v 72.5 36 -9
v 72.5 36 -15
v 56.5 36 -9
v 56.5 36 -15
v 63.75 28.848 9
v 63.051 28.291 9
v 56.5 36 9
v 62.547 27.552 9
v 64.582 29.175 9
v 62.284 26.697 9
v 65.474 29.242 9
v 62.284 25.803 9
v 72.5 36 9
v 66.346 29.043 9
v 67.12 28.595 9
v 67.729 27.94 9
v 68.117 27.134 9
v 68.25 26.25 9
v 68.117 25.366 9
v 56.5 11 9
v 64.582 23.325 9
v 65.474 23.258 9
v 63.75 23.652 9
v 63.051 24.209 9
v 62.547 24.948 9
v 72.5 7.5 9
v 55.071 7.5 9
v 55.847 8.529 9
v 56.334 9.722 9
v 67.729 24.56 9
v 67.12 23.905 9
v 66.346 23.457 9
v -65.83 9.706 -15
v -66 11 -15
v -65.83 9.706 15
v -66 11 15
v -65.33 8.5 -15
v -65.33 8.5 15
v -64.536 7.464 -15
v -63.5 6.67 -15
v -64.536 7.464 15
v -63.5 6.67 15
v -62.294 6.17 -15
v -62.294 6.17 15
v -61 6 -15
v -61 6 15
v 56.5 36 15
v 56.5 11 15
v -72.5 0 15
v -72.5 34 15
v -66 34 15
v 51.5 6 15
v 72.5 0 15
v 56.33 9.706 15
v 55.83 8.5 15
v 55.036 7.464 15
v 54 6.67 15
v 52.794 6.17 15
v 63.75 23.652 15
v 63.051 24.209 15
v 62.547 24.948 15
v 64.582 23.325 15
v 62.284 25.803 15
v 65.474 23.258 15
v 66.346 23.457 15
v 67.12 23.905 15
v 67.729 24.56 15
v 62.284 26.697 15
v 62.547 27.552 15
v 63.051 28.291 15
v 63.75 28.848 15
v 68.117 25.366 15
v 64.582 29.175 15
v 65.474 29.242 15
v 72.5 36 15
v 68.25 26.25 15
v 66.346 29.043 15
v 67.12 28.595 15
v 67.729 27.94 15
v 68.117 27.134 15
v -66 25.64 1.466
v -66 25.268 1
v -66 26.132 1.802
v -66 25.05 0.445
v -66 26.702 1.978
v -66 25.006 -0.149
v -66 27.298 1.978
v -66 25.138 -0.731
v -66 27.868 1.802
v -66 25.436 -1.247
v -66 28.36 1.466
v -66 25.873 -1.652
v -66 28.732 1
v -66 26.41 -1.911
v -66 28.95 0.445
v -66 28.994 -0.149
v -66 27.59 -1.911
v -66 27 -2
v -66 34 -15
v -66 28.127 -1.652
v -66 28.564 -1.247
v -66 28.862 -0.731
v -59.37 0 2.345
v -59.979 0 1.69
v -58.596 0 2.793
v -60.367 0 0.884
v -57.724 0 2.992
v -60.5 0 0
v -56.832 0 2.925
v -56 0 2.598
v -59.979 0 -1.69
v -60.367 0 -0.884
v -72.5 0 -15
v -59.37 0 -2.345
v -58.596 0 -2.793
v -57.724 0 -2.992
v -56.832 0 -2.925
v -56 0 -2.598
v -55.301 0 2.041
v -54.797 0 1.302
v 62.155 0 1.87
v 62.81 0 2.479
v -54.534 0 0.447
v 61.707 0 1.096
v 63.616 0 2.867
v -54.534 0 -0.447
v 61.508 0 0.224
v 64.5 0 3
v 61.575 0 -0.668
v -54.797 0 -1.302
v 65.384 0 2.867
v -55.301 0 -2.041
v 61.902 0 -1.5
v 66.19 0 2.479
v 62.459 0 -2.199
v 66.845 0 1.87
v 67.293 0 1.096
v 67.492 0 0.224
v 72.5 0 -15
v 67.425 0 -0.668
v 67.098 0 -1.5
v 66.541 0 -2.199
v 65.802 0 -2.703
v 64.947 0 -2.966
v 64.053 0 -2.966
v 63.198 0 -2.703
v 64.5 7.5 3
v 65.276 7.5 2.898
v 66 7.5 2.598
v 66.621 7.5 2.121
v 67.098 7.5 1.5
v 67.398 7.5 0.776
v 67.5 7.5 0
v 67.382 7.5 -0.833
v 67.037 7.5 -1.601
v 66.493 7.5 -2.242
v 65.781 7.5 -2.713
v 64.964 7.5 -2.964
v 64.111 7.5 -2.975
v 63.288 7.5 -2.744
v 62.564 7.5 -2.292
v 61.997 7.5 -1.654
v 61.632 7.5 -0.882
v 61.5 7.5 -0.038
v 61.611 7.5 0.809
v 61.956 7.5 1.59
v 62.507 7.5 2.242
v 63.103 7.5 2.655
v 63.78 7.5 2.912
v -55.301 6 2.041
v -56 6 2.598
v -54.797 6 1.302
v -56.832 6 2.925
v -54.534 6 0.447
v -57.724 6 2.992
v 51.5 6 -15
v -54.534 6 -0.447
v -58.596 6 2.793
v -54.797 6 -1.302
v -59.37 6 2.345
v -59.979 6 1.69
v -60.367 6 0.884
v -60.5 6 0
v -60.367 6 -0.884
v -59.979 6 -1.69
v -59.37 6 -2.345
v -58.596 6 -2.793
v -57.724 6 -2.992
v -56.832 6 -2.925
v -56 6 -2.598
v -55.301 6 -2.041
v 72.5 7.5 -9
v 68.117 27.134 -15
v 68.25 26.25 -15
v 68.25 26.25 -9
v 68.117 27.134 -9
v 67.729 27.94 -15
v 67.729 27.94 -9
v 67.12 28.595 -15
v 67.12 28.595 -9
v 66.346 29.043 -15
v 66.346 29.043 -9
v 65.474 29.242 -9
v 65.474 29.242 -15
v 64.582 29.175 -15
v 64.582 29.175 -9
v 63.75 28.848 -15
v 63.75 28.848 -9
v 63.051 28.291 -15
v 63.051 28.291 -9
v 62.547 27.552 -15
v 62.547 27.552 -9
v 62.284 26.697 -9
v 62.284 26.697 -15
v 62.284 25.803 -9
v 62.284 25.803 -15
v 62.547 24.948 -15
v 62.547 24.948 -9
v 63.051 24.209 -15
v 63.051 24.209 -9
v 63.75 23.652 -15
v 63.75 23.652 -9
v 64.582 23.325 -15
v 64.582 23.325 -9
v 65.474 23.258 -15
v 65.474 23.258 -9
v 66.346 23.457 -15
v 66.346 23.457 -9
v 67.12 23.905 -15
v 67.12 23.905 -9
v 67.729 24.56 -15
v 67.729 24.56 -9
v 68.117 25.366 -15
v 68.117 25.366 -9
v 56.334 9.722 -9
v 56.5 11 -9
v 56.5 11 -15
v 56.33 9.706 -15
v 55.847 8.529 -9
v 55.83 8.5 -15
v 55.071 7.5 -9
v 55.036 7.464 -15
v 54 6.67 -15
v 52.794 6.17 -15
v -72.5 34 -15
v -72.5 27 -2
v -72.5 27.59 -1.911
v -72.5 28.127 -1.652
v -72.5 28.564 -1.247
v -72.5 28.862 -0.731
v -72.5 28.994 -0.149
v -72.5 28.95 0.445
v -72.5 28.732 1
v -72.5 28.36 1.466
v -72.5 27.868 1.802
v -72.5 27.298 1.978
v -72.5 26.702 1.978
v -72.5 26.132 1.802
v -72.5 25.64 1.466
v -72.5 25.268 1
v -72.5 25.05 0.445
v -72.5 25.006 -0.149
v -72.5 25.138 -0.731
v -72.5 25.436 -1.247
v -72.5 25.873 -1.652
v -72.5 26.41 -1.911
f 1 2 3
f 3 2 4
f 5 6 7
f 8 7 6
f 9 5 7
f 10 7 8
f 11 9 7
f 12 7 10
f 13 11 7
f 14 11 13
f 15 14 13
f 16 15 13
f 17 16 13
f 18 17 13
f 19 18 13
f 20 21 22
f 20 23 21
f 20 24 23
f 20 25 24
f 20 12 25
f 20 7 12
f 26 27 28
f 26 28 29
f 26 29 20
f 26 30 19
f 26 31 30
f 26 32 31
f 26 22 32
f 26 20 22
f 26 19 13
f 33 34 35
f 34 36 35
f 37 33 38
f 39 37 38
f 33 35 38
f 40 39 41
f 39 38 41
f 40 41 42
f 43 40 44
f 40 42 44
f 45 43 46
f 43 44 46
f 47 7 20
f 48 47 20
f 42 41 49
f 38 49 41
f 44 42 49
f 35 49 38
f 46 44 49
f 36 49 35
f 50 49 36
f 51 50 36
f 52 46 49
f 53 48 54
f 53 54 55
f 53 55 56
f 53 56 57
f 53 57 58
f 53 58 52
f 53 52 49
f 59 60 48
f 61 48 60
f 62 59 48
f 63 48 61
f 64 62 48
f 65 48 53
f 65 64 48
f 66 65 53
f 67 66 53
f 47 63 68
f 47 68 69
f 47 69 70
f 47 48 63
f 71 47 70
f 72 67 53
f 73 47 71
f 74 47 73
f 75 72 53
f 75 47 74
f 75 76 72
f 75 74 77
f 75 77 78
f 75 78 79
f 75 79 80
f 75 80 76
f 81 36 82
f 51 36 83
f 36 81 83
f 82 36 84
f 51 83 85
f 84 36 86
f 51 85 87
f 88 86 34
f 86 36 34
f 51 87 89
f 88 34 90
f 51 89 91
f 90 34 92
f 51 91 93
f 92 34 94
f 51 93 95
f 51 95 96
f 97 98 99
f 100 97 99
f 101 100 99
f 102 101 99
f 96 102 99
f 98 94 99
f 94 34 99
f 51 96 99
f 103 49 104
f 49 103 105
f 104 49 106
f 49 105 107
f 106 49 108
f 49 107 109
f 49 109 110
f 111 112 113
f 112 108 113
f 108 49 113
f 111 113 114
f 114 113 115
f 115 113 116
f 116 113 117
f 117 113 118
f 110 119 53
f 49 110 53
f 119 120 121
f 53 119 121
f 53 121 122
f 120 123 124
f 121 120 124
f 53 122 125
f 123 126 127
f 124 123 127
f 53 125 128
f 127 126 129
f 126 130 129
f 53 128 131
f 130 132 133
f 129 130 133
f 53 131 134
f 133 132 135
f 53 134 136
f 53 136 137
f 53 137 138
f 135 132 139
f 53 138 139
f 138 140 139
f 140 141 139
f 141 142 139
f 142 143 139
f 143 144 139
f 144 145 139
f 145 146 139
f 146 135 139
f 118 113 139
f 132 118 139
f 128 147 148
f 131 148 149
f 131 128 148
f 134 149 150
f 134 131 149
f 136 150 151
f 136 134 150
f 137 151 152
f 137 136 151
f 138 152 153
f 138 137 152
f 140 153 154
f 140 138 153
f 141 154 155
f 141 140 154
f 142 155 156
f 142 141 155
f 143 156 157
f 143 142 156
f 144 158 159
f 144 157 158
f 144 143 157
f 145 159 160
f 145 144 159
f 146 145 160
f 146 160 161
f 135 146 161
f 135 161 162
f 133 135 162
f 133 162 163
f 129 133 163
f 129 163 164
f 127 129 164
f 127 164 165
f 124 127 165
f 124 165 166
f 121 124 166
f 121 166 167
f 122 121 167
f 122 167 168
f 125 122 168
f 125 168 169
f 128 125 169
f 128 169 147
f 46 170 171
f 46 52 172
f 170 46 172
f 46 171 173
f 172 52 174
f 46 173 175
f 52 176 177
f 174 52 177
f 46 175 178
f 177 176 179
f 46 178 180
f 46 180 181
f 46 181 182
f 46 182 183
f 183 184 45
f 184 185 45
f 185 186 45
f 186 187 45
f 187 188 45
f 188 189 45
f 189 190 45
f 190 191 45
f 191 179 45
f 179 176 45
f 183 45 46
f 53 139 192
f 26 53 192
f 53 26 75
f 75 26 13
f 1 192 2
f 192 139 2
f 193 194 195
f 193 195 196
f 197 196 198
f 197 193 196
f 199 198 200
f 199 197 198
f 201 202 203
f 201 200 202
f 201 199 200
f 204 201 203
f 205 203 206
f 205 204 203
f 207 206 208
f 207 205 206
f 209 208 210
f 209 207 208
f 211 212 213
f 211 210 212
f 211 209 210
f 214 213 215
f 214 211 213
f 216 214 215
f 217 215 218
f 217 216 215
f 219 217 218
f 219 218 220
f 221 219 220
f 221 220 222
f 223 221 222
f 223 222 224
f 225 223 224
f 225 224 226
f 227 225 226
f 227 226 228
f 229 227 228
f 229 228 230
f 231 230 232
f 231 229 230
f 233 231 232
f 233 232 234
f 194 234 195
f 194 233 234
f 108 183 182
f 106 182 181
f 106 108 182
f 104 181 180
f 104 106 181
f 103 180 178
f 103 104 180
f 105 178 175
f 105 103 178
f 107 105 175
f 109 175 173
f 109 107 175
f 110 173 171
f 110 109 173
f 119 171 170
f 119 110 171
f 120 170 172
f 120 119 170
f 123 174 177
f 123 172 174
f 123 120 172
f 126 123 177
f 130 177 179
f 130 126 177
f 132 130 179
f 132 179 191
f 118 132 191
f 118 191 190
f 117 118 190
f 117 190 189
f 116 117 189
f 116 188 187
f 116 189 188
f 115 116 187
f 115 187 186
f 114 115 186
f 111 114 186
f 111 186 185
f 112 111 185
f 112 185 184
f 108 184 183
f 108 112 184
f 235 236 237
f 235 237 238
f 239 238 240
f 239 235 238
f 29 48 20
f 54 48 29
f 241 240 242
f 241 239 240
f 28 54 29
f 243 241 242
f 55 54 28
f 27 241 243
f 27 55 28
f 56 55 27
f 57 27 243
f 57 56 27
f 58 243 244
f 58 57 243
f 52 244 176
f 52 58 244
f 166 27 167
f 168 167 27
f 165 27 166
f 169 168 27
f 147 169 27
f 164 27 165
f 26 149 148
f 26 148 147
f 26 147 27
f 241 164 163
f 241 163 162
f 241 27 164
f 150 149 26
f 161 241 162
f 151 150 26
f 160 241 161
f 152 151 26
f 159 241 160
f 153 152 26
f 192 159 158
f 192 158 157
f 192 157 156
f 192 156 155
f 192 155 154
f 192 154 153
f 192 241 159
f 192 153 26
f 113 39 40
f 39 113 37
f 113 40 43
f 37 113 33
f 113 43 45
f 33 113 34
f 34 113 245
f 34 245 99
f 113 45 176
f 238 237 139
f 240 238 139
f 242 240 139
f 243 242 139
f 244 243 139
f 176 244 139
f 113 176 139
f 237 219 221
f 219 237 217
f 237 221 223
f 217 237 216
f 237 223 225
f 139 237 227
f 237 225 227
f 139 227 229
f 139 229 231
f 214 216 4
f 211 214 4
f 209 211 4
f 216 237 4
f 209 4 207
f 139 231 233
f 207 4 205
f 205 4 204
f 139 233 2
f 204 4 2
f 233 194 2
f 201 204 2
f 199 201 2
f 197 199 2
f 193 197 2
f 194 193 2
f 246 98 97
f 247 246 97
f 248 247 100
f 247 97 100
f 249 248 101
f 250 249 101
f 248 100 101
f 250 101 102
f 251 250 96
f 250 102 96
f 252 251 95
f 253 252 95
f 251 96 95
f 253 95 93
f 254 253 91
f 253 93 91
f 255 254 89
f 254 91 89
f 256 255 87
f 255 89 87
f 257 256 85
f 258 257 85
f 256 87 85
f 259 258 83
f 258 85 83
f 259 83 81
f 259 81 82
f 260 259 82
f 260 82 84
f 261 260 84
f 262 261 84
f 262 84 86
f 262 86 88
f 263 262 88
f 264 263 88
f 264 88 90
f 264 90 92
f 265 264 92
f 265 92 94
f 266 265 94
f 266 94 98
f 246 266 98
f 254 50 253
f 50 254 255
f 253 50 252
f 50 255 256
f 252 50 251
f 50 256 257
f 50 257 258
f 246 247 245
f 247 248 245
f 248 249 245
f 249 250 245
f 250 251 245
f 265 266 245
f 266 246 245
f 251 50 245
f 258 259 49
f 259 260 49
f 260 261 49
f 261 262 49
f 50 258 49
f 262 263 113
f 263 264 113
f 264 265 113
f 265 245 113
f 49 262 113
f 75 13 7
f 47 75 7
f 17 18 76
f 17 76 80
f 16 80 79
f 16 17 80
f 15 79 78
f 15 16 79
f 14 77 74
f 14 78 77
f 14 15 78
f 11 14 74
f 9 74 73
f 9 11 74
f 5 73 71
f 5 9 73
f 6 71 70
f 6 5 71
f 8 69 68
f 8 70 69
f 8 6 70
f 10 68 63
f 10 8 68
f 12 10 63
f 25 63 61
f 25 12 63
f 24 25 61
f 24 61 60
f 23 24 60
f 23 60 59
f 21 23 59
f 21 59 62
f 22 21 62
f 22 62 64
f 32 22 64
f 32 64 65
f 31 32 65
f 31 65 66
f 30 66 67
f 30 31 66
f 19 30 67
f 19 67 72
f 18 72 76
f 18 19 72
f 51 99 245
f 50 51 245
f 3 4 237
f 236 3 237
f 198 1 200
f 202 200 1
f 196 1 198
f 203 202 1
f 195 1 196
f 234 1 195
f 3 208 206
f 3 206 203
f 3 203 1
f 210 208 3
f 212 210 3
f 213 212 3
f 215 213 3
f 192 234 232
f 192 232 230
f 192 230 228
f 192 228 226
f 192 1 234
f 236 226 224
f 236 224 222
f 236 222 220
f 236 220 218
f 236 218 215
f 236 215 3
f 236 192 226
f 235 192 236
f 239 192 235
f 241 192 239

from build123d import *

# Parameters (mm, degrees)
BOSS_EXTRUDE1_DEPTH      = 15
BOSS_EXTRUDE1_DEPTH_BACK = 15
SKETCH2_R                = 3
CUT_EXTRUDE1_DEPTH       = 83.324054808
FILLET1_R                = 5
CUT_EXTRUDE2_START       = -28.5
SKETCH3_W                = 5
SKETCH3_H                = 18
CUT_EXTRUDE2_DEPTH       = 28.5
CUT_EXTRUDE3_DEPTH       = 83.324054808
CUT_EXTRUDE3_DEPTH_BACK  = 83.324054808
SKETCH4_R                = 3
SKETCH5_R                = 2
CUT_EXTRUDE4_DEPTH       = 83.324054808


with BuildPart() as part:
    # Sketch1 → Boss-Extrude1 (new, two sides: drawn at the far end of the back side and taken through both)
    with BuildSketch(Plane.XY.offset(-BOSS_EXTRUDE1_DEPTH_BACK)):
        Polygon((-72.5, 34), (-72.5, 0), (72.5, 0), (72.5, 36), (56.5, 36), (56.5, 6), (-66, 6), (-66, 34), align=None)
    extrude(amount=BOSS_EXTRUDE1_DEPTH + BOSS_EXTRUDE1_DEPTH_BACK)

    # Sketch2 → Cut-Extrude1 (cut, through all)
    with BuildSketch(Plane(origin=(0, 0, 0), x_dir=(1, 0, 0), z_dir=(0, 1, 0))):
        with Locations(Location((-57.5, 0, 0), (0, 0, 180))):
            Circle(SKETCH2_R)
        with Locations(Location((64.5, 0, 0), (0, 0, 270))):
            Circle(SKETCH2_R)
    extrude(amount=CUT_EXTRUDE1_DEPTH, mode=Mode.SUBTRACT)

    # Fillet1
    fillet1_edges = [part.edges().sort_by_distance(p)[0] for p in [
        (-66, 6, 0),
        (56.5, 6, 0),
    ]]
    fillet(fillet1_edges, radius=FILLET1_R)

    # Sketch3 → Cut-Extrude2 (cut)
    with BuildSketch(Plane(origin=(0, 36, 0), x_dir=(1, 0, 0), z_dir=(0, 1, 0)).offset(CUT_EXTRUDE2_START)):
        with BuildLine():
            Line((72.5, 9), (56.5, 9))
            Line((56.5, 9), (56.5, -9))
            Line((56.5, -9), (62.506908484, -2.242227956))
            ThreePointArc((62.506908484, -2.242227956), (62.257772044, 1.993091516), (66.493091516, 2.242227956))
            Line((66.493091516, 2.242227956), (72.5, 9))
        make_face()
        with Locations((54, 0)):
            Rectangle(SKETCH3_W, SKETCH3_H)
        with BuildLine():
            Line((72.5, -9), (72.5, 9))
            Line((72.5, 9), (66.493091516, 2.242227956))
            ThreePointArc((66.493091516, 2.242227956), (67.236720167, 1.228968155), (67.5, 0))
            ThreePointArc((67.5, 0), (65.728968155, -2.736720167), (62.506908484, -2.242227956))
            Line((62.506908484, -2.242227956), (56.5, -9))
            Line((56.5, -9), (72.5, -9))
        make_face()
    extrude(amount=CUT_EXTRUDE2_DEPTH, mode=Mode.SUBTRACT)

    # Sketch4 → Cut-Extrude3 (cut, two sides: drawn at the far end of the back side and taken through both)
    with BuildSketch(Plane.XY.offset(-CUT_EXTRUDE3_DEPTH_BACK)):
        with Locations((65.25, 26.25)):
            Circle(SKETCH4_R)
    extrude(amount=CUT_EXTRUDE3_DEPTH + CUT_EXTRUDE3_DEPTH_BACK, mode=Mode.SUBTRACT)

    # Sketch5 → Cut-Extrude4 (cut, through all)
    with BuildSketch(Plane(origin=(0, 0, 0), x_dir=(0, 0, -1), z_dir=(1, 0, 0))):
        with Locations((0, 27)):
            Circle(SKETCH5_R)
    extrude(amount=-CUT_EXTRUDE4_DEPTH, mode=Mode.SUBTRACT)


solid = part.part
